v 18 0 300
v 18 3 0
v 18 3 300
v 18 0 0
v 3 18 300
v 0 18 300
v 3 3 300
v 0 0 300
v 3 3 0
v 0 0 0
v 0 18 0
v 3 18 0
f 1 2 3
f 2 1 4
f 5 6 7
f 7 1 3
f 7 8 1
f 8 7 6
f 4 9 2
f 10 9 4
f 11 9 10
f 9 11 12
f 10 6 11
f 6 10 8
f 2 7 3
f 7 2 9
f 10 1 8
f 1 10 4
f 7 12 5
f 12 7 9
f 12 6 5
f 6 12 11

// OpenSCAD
module tube(size, length)
{
	cube([length, size, size]);
}

module angle(size, thickness, length)
{
	s = size;
	t = thickness;
	l = length;

	union()
	{
		cube([s, t, l]);
		cube([t, s, l]);
	}
}

angle(18, 3, 300);
